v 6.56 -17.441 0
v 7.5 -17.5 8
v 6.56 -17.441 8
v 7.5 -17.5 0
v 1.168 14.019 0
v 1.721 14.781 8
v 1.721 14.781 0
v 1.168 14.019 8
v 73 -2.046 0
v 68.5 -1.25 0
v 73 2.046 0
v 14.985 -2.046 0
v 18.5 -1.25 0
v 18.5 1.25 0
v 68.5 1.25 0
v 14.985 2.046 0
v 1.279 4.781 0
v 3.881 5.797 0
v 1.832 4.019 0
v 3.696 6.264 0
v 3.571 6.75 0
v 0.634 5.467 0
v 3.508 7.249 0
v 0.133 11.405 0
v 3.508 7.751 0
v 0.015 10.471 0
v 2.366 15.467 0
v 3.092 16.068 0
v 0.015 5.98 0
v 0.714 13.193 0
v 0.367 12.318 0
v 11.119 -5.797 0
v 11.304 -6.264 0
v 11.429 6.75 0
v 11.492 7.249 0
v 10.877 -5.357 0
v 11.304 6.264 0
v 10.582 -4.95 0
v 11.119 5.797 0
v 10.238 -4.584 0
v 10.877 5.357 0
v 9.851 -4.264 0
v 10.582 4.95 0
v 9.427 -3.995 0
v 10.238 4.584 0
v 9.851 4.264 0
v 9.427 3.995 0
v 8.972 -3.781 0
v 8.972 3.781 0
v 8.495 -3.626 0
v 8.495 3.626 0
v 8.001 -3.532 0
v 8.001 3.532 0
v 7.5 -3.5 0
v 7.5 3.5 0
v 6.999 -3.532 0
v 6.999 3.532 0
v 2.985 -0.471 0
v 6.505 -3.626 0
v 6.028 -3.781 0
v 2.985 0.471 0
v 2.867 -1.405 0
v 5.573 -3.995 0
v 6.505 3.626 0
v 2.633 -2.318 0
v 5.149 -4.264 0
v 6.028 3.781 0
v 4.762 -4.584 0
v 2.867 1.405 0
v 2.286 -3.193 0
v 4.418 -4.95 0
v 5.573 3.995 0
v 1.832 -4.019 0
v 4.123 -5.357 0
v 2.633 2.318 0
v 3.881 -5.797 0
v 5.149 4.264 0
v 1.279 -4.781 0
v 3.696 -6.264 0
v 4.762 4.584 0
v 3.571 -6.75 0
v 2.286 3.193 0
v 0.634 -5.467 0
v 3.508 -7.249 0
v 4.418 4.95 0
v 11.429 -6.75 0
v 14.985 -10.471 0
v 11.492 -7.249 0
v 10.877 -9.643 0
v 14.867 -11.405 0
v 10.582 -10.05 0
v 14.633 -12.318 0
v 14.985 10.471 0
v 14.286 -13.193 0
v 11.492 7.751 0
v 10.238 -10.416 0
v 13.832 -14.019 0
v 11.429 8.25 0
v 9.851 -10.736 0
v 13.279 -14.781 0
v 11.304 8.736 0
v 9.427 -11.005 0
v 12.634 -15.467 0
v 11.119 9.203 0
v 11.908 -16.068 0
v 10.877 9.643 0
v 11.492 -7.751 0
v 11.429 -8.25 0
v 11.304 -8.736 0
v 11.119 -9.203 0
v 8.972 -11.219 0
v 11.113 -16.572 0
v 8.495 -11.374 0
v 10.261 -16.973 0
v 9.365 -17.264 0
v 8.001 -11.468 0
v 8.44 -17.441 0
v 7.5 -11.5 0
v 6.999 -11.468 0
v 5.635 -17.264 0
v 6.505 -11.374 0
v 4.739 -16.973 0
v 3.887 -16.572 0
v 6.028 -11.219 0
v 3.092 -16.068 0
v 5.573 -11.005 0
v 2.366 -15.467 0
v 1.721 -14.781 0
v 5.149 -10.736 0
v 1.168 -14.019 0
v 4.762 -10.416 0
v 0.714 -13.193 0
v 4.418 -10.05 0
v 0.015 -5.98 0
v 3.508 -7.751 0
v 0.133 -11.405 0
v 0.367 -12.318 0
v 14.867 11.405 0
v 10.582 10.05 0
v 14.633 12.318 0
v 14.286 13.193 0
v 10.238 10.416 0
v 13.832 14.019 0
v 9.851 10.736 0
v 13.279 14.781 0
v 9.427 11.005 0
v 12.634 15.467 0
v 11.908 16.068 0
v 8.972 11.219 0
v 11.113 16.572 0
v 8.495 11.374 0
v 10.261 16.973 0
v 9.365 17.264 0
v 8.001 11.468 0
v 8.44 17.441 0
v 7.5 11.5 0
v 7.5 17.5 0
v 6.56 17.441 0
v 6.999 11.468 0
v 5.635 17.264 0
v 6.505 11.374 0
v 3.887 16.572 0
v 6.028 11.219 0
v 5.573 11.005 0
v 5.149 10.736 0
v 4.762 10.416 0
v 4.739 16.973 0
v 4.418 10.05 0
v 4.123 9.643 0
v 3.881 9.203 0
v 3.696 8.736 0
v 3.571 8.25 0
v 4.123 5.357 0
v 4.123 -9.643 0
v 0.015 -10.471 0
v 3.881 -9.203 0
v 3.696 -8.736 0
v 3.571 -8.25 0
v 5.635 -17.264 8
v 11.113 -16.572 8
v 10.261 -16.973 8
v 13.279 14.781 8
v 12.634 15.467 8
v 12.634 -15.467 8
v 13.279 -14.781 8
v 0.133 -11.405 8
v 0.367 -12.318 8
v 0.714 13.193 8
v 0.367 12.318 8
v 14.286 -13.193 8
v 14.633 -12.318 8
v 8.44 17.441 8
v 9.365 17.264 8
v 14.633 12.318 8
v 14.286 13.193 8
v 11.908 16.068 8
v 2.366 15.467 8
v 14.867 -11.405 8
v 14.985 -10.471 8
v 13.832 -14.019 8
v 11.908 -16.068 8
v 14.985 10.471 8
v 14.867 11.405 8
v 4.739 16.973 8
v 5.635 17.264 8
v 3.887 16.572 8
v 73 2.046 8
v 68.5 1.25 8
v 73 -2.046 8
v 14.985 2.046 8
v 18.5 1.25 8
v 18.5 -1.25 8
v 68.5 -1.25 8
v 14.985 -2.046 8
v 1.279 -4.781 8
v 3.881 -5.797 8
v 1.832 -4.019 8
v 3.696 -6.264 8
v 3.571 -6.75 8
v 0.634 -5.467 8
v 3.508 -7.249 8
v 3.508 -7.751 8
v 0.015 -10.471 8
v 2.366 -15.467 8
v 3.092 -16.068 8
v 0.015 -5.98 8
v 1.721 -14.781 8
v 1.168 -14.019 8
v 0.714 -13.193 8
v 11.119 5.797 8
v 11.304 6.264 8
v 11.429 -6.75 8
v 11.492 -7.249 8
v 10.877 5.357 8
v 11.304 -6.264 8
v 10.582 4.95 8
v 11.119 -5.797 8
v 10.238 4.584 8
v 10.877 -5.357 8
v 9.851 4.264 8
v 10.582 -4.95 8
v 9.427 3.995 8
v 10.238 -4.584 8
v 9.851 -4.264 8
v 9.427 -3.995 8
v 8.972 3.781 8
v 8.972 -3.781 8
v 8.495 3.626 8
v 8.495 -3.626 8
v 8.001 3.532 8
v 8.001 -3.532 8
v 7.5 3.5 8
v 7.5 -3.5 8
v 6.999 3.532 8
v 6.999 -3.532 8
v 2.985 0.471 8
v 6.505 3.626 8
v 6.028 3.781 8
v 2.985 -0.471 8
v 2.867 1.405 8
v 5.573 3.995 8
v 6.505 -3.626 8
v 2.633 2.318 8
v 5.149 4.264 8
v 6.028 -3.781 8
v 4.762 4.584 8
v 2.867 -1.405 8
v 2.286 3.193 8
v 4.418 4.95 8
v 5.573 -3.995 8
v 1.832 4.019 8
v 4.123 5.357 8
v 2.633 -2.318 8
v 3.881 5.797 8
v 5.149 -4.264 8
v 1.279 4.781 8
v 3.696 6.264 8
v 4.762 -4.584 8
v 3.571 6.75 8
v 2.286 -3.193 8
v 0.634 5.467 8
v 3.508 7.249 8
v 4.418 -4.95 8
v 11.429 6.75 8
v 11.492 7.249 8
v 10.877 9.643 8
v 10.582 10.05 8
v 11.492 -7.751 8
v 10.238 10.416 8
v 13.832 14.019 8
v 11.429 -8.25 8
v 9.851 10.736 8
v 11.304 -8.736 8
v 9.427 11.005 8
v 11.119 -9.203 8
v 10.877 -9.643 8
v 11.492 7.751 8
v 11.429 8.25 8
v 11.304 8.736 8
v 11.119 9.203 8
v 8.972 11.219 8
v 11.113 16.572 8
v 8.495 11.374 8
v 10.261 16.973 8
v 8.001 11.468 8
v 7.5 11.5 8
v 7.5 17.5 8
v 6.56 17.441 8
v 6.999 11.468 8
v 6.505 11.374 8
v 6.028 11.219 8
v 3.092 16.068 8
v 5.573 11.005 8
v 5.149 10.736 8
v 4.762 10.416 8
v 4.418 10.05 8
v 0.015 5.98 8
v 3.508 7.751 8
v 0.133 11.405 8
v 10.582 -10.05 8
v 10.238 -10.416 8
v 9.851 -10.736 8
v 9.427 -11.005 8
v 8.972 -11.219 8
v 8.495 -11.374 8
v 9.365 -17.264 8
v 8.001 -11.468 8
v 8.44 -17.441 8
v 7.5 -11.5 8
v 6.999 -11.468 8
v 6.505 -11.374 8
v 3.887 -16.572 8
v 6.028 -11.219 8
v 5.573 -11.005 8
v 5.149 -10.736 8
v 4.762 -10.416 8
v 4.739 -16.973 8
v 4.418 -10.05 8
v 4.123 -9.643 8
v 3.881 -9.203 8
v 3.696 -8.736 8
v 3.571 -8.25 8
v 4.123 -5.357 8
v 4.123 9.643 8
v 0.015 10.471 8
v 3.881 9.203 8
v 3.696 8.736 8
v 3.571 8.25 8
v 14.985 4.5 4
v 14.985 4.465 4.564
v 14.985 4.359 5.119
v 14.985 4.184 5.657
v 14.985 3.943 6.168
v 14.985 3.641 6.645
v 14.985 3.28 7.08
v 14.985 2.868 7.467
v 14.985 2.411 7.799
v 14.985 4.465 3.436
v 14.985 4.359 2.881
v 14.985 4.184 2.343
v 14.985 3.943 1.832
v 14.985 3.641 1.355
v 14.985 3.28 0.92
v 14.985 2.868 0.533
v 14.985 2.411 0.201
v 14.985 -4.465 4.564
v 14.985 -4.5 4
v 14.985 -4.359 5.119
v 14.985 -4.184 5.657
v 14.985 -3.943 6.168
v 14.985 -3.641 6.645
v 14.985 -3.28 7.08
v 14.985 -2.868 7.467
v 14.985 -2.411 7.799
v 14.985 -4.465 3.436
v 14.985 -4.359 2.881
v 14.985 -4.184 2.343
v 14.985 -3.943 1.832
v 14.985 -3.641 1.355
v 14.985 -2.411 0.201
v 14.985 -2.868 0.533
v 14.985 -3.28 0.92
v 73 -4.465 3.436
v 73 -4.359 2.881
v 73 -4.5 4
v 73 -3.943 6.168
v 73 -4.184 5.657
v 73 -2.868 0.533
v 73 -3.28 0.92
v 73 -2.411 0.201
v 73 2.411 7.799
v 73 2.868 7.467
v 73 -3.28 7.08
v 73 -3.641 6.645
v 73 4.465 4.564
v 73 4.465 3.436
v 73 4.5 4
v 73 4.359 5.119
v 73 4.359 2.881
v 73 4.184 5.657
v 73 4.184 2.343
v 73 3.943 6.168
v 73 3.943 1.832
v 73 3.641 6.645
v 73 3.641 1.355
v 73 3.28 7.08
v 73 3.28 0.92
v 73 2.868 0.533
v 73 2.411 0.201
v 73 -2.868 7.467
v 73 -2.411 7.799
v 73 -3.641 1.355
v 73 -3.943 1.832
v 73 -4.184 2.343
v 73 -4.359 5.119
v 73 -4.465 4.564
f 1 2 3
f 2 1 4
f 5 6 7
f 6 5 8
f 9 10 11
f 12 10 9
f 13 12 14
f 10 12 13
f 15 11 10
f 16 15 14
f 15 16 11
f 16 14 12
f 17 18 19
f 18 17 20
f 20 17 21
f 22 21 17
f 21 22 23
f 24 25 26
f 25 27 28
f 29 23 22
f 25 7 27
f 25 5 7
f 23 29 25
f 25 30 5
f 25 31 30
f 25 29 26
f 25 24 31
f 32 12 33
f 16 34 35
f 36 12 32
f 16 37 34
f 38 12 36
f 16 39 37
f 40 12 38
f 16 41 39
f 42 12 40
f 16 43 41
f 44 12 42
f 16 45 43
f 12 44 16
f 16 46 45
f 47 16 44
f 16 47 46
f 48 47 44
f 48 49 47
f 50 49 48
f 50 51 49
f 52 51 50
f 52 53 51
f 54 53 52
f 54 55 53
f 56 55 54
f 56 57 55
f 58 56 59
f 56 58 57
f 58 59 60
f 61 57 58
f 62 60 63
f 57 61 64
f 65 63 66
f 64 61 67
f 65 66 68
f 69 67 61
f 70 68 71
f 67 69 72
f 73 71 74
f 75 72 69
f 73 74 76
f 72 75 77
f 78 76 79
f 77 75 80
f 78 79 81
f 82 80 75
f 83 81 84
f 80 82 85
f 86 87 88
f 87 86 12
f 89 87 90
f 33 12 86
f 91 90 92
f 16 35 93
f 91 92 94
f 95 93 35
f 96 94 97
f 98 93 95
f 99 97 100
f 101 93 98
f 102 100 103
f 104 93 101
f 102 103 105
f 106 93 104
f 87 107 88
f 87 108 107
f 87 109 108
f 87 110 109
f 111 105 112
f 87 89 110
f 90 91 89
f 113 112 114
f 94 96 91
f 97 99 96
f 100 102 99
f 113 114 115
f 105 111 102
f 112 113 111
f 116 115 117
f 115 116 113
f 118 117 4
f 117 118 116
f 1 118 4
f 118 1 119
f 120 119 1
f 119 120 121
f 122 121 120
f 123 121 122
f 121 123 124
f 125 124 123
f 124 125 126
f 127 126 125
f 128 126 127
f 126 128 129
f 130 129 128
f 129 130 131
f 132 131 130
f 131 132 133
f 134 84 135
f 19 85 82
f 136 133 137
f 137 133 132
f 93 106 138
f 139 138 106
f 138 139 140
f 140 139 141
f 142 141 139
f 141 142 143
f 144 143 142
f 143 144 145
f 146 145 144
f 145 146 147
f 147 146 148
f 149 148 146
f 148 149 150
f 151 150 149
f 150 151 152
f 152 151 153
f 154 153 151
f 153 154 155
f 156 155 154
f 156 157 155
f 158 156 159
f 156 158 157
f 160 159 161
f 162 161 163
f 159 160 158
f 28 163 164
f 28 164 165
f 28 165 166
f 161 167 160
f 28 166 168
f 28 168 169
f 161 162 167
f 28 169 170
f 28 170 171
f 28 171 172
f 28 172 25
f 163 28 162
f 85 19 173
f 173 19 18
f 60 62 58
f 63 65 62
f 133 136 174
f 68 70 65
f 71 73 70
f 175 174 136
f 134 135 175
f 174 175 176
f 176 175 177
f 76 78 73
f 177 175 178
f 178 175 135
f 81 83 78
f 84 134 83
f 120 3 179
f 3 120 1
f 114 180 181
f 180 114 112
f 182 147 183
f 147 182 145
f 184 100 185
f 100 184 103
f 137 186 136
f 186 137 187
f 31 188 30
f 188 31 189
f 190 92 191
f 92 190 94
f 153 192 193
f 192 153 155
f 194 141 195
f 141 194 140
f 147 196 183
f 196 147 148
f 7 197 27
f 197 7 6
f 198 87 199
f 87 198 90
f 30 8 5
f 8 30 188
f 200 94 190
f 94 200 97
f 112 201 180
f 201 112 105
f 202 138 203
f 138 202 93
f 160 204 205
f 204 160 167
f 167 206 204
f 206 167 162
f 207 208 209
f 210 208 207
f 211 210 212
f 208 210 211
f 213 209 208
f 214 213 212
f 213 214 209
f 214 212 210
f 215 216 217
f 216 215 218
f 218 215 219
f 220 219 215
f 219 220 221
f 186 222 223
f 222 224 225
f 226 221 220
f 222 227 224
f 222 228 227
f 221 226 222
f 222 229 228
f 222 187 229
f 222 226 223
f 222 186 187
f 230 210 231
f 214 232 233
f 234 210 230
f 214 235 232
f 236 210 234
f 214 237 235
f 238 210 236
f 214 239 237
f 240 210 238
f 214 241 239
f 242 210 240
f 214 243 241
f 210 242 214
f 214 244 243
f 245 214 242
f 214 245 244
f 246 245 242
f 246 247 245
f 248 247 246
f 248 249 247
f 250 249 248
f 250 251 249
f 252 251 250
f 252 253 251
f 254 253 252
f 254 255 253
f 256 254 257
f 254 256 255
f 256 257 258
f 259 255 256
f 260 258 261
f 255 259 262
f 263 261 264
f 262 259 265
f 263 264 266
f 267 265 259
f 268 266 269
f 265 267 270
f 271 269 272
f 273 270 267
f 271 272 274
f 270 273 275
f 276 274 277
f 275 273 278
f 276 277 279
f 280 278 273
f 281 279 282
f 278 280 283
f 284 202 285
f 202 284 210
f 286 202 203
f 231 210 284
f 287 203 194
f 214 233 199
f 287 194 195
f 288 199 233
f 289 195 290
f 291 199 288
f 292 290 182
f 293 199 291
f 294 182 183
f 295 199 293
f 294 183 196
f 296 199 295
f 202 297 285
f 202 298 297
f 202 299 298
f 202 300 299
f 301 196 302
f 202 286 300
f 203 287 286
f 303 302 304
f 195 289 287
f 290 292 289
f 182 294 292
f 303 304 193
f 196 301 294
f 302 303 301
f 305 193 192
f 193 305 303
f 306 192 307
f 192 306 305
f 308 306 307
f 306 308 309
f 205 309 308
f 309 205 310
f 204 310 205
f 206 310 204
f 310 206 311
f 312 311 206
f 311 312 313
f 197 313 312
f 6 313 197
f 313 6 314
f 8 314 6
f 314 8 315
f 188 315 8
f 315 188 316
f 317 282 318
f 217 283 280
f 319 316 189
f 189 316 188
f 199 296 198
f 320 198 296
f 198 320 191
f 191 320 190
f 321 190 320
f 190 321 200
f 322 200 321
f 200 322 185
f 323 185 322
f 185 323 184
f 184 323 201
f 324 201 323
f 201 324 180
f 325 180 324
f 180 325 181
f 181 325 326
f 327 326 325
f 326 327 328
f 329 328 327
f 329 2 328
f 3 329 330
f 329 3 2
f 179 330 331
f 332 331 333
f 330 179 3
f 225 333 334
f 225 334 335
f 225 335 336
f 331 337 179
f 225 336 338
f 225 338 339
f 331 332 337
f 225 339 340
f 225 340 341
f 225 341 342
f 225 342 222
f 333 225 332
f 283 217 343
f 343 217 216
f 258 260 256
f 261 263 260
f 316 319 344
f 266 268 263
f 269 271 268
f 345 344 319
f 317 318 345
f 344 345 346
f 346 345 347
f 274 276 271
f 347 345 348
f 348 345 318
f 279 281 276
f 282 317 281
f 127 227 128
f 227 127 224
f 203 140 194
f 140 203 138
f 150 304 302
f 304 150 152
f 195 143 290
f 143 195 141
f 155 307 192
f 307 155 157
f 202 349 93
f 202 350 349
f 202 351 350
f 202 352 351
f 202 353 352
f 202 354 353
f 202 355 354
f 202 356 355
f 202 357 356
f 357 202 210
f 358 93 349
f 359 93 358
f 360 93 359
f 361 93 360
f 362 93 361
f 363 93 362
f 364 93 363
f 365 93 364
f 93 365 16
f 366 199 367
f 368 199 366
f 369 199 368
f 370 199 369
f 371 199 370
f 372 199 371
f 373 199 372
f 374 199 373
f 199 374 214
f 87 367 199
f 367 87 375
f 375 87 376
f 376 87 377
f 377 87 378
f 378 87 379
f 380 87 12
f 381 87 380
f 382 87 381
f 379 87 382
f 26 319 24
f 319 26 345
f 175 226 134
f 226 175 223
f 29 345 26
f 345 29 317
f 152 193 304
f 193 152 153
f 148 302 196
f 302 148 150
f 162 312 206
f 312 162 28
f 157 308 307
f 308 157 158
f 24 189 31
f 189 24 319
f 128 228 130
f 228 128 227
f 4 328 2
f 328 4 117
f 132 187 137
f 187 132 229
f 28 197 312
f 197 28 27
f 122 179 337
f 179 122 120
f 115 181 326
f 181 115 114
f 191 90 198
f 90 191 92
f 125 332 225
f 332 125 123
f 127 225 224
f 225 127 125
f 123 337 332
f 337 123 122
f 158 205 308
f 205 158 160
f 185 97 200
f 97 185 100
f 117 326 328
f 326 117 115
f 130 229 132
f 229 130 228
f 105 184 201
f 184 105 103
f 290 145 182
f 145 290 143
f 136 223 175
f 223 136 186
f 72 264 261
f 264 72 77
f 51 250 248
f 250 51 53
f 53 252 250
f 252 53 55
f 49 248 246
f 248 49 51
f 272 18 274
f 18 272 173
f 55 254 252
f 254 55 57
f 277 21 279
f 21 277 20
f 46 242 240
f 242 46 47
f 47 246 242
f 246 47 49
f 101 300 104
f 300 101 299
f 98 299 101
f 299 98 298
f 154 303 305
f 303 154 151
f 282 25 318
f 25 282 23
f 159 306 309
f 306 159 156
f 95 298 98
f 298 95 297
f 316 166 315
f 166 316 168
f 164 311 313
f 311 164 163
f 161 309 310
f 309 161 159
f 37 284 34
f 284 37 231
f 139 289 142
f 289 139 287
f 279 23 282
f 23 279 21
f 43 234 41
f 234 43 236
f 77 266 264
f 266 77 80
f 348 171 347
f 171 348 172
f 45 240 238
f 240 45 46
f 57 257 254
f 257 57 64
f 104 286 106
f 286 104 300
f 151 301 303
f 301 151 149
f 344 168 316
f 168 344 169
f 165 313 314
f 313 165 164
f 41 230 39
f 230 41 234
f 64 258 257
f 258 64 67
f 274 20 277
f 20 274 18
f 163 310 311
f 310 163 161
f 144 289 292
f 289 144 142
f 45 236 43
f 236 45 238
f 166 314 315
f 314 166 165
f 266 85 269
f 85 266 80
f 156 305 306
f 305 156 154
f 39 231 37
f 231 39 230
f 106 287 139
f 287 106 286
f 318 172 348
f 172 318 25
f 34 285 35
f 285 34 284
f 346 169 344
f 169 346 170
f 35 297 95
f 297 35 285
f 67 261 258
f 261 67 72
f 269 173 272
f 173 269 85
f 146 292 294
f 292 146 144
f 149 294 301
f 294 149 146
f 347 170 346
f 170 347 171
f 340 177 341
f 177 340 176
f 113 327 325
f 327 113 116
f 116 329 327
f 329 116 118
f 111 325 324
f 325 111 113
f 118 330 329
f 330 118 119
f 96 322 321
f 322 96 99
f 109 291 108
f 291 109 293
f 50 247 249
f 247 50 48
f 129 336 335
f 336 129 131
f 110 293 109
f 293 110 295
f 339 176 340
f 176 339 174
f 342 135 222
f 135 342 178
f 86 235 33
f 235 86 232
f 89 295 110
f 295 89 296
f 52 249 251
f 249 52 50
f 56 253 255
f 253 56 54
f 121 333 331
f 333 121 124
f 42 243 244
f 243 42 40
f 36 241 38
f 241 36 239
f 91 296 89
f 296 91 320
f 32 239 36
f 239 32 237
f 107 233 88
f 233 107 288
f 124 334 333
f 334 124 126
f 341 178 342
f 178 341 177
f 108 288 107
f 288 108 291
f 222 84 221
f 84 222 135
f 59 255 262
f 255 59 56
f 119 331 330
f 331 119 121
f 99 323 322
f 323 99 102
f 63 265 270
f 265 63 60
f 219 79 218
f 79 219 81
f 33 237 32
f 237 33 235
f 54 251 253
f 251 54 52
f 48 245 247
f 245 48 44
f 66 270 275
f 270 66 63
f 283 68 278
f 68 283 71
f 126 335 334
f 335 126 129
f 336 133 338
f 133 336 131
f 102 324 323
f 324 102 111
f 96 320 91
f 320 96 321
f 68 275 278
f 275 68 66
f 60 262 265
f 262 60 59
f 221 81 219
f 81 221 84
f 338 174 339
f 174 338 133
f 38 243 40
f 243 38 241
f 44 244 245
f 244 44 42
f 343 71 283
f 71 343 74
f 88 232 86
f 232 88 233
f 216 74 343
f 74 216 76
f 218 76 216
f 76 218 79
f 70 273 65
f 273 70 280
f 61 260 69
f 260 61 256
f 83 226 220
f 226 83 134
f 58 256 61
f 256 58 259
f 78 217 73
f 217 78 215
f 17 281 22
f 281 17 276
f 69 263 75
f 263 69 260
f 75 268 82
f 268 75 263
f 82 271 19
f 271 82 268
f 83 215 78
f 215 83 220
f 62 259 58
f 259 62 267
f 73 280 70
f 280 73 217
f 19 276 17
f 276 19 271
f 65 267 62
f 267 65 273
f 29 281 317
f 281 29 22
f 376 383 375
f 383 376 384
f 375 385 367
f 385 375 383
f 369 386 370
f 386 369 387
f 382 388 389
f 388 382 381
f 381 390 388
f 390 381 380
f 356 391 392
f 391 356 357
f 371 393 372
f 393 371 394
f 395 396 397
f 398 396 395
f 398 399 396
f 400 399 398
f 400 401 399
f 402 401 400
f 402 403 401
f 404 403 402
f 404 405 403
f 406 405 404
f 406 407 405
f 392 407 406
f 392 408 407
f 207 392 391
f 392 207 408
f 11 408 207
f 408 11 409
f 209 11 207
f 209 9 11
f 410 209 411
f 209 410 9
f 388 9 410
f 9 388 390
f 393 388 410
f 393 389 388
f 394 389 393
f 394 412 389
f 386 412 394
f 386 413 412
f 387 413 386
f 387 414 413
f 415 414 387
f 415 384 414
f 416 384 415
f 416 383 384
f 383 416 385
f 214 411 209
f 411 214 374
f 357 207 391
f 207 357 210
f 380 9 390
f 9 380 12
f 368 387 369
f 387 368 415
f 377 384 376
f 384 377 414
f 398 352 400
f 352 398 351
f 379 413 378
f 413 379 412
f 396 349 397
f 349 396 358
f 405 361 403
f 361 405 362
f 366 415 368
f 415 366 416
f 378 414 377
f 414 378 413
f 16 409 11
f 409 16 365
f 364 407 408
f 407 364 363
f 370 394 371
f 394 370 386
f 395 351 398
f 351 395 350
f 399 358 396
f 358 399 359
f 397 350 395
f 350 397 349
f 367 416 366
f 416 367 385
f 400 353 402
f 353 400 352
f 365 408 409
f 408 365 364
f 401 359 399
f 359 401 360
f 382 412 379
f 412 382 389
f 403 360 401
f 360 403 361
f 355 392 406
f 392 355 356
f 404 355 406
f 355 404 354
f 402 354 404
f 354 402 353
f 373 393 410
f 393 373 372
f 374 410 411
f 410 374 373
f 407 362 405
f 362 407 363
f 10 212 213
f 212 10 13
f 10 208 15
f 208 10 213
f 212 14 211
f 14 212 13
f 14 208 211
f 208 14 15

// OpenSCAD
//////
// Tooth-paste/Paint Tube Key
//
// http://www.thingiverse.com/thing:21410
// By: Alan Yates <thingiverse@alanyates.com>
//////

// geometry
barrel_diameter = 9.0;
barrel_flats = 8.0;
slot_width = 2.5;
slot_length = 50.0;
key_width = 35.0;
key_height = 15.0;
hole_diameter = 8;

// tolerances
overlap = 1;
$fn = 50;

translate([0, 0, barrel_flats/2])
	rotate(-90, [0, 0, 1]) rotate(-90, [1, 0, 0])
		tube_key(barrel_diameter, barrel_flats, slot_width, slot_length, key_width, key_height, hole_diameter);

module tube_key(bd, bf, sw, sl, kw, kh, hd) {
	union() {
		translate([0, 0, kh/2])
			rotate(90, [1, 0, 0]) {
				difference() {
					hull() {
						translate([kw/2 - kh/2, 0, 0])
							cylinder(r = kh/2, h = bf, center = true);
						translate([- kw/2 + kh/2, 0, 0])
							cylinder(r = kh/2, h = bf, center = true);
					}
#					translate([-kh/2, 0, -bf/2-overlap])
						cylinder(r = hd/2, h = bf + 2*overlap);
#					translate([kh/2, 0, -bf/2-overlap])
						cylinder(r = hd/2, h = bf + 2*overlap);
#					translate([0, -4*kh/5, -bf/2-overlap])
						cylinder(r = kh/2, h = bf + 2*overlap);
				}
			}
		translate([0, 0, kh - overlap])
			difference() {
				cylinder(r = bd/2, h = sl + bd);
		
#				translate([-sw/2, -bd/2 - overlap, bd/2])
					cube([sw, bd + 2*overlap, sl]);
#				translate([-bd/2 - overlap, bf/2, -overlap])
					cube([bd + 2*overlap, bd/2, sl + bd + 2*overlap]);
#				translate([-bd/2 - overlap, -bf/2 - bd/2, -overlap])
					cube([bd + 2*overlap, bd/2, sl + bd + 2*overlap]);
			}
	}
}
